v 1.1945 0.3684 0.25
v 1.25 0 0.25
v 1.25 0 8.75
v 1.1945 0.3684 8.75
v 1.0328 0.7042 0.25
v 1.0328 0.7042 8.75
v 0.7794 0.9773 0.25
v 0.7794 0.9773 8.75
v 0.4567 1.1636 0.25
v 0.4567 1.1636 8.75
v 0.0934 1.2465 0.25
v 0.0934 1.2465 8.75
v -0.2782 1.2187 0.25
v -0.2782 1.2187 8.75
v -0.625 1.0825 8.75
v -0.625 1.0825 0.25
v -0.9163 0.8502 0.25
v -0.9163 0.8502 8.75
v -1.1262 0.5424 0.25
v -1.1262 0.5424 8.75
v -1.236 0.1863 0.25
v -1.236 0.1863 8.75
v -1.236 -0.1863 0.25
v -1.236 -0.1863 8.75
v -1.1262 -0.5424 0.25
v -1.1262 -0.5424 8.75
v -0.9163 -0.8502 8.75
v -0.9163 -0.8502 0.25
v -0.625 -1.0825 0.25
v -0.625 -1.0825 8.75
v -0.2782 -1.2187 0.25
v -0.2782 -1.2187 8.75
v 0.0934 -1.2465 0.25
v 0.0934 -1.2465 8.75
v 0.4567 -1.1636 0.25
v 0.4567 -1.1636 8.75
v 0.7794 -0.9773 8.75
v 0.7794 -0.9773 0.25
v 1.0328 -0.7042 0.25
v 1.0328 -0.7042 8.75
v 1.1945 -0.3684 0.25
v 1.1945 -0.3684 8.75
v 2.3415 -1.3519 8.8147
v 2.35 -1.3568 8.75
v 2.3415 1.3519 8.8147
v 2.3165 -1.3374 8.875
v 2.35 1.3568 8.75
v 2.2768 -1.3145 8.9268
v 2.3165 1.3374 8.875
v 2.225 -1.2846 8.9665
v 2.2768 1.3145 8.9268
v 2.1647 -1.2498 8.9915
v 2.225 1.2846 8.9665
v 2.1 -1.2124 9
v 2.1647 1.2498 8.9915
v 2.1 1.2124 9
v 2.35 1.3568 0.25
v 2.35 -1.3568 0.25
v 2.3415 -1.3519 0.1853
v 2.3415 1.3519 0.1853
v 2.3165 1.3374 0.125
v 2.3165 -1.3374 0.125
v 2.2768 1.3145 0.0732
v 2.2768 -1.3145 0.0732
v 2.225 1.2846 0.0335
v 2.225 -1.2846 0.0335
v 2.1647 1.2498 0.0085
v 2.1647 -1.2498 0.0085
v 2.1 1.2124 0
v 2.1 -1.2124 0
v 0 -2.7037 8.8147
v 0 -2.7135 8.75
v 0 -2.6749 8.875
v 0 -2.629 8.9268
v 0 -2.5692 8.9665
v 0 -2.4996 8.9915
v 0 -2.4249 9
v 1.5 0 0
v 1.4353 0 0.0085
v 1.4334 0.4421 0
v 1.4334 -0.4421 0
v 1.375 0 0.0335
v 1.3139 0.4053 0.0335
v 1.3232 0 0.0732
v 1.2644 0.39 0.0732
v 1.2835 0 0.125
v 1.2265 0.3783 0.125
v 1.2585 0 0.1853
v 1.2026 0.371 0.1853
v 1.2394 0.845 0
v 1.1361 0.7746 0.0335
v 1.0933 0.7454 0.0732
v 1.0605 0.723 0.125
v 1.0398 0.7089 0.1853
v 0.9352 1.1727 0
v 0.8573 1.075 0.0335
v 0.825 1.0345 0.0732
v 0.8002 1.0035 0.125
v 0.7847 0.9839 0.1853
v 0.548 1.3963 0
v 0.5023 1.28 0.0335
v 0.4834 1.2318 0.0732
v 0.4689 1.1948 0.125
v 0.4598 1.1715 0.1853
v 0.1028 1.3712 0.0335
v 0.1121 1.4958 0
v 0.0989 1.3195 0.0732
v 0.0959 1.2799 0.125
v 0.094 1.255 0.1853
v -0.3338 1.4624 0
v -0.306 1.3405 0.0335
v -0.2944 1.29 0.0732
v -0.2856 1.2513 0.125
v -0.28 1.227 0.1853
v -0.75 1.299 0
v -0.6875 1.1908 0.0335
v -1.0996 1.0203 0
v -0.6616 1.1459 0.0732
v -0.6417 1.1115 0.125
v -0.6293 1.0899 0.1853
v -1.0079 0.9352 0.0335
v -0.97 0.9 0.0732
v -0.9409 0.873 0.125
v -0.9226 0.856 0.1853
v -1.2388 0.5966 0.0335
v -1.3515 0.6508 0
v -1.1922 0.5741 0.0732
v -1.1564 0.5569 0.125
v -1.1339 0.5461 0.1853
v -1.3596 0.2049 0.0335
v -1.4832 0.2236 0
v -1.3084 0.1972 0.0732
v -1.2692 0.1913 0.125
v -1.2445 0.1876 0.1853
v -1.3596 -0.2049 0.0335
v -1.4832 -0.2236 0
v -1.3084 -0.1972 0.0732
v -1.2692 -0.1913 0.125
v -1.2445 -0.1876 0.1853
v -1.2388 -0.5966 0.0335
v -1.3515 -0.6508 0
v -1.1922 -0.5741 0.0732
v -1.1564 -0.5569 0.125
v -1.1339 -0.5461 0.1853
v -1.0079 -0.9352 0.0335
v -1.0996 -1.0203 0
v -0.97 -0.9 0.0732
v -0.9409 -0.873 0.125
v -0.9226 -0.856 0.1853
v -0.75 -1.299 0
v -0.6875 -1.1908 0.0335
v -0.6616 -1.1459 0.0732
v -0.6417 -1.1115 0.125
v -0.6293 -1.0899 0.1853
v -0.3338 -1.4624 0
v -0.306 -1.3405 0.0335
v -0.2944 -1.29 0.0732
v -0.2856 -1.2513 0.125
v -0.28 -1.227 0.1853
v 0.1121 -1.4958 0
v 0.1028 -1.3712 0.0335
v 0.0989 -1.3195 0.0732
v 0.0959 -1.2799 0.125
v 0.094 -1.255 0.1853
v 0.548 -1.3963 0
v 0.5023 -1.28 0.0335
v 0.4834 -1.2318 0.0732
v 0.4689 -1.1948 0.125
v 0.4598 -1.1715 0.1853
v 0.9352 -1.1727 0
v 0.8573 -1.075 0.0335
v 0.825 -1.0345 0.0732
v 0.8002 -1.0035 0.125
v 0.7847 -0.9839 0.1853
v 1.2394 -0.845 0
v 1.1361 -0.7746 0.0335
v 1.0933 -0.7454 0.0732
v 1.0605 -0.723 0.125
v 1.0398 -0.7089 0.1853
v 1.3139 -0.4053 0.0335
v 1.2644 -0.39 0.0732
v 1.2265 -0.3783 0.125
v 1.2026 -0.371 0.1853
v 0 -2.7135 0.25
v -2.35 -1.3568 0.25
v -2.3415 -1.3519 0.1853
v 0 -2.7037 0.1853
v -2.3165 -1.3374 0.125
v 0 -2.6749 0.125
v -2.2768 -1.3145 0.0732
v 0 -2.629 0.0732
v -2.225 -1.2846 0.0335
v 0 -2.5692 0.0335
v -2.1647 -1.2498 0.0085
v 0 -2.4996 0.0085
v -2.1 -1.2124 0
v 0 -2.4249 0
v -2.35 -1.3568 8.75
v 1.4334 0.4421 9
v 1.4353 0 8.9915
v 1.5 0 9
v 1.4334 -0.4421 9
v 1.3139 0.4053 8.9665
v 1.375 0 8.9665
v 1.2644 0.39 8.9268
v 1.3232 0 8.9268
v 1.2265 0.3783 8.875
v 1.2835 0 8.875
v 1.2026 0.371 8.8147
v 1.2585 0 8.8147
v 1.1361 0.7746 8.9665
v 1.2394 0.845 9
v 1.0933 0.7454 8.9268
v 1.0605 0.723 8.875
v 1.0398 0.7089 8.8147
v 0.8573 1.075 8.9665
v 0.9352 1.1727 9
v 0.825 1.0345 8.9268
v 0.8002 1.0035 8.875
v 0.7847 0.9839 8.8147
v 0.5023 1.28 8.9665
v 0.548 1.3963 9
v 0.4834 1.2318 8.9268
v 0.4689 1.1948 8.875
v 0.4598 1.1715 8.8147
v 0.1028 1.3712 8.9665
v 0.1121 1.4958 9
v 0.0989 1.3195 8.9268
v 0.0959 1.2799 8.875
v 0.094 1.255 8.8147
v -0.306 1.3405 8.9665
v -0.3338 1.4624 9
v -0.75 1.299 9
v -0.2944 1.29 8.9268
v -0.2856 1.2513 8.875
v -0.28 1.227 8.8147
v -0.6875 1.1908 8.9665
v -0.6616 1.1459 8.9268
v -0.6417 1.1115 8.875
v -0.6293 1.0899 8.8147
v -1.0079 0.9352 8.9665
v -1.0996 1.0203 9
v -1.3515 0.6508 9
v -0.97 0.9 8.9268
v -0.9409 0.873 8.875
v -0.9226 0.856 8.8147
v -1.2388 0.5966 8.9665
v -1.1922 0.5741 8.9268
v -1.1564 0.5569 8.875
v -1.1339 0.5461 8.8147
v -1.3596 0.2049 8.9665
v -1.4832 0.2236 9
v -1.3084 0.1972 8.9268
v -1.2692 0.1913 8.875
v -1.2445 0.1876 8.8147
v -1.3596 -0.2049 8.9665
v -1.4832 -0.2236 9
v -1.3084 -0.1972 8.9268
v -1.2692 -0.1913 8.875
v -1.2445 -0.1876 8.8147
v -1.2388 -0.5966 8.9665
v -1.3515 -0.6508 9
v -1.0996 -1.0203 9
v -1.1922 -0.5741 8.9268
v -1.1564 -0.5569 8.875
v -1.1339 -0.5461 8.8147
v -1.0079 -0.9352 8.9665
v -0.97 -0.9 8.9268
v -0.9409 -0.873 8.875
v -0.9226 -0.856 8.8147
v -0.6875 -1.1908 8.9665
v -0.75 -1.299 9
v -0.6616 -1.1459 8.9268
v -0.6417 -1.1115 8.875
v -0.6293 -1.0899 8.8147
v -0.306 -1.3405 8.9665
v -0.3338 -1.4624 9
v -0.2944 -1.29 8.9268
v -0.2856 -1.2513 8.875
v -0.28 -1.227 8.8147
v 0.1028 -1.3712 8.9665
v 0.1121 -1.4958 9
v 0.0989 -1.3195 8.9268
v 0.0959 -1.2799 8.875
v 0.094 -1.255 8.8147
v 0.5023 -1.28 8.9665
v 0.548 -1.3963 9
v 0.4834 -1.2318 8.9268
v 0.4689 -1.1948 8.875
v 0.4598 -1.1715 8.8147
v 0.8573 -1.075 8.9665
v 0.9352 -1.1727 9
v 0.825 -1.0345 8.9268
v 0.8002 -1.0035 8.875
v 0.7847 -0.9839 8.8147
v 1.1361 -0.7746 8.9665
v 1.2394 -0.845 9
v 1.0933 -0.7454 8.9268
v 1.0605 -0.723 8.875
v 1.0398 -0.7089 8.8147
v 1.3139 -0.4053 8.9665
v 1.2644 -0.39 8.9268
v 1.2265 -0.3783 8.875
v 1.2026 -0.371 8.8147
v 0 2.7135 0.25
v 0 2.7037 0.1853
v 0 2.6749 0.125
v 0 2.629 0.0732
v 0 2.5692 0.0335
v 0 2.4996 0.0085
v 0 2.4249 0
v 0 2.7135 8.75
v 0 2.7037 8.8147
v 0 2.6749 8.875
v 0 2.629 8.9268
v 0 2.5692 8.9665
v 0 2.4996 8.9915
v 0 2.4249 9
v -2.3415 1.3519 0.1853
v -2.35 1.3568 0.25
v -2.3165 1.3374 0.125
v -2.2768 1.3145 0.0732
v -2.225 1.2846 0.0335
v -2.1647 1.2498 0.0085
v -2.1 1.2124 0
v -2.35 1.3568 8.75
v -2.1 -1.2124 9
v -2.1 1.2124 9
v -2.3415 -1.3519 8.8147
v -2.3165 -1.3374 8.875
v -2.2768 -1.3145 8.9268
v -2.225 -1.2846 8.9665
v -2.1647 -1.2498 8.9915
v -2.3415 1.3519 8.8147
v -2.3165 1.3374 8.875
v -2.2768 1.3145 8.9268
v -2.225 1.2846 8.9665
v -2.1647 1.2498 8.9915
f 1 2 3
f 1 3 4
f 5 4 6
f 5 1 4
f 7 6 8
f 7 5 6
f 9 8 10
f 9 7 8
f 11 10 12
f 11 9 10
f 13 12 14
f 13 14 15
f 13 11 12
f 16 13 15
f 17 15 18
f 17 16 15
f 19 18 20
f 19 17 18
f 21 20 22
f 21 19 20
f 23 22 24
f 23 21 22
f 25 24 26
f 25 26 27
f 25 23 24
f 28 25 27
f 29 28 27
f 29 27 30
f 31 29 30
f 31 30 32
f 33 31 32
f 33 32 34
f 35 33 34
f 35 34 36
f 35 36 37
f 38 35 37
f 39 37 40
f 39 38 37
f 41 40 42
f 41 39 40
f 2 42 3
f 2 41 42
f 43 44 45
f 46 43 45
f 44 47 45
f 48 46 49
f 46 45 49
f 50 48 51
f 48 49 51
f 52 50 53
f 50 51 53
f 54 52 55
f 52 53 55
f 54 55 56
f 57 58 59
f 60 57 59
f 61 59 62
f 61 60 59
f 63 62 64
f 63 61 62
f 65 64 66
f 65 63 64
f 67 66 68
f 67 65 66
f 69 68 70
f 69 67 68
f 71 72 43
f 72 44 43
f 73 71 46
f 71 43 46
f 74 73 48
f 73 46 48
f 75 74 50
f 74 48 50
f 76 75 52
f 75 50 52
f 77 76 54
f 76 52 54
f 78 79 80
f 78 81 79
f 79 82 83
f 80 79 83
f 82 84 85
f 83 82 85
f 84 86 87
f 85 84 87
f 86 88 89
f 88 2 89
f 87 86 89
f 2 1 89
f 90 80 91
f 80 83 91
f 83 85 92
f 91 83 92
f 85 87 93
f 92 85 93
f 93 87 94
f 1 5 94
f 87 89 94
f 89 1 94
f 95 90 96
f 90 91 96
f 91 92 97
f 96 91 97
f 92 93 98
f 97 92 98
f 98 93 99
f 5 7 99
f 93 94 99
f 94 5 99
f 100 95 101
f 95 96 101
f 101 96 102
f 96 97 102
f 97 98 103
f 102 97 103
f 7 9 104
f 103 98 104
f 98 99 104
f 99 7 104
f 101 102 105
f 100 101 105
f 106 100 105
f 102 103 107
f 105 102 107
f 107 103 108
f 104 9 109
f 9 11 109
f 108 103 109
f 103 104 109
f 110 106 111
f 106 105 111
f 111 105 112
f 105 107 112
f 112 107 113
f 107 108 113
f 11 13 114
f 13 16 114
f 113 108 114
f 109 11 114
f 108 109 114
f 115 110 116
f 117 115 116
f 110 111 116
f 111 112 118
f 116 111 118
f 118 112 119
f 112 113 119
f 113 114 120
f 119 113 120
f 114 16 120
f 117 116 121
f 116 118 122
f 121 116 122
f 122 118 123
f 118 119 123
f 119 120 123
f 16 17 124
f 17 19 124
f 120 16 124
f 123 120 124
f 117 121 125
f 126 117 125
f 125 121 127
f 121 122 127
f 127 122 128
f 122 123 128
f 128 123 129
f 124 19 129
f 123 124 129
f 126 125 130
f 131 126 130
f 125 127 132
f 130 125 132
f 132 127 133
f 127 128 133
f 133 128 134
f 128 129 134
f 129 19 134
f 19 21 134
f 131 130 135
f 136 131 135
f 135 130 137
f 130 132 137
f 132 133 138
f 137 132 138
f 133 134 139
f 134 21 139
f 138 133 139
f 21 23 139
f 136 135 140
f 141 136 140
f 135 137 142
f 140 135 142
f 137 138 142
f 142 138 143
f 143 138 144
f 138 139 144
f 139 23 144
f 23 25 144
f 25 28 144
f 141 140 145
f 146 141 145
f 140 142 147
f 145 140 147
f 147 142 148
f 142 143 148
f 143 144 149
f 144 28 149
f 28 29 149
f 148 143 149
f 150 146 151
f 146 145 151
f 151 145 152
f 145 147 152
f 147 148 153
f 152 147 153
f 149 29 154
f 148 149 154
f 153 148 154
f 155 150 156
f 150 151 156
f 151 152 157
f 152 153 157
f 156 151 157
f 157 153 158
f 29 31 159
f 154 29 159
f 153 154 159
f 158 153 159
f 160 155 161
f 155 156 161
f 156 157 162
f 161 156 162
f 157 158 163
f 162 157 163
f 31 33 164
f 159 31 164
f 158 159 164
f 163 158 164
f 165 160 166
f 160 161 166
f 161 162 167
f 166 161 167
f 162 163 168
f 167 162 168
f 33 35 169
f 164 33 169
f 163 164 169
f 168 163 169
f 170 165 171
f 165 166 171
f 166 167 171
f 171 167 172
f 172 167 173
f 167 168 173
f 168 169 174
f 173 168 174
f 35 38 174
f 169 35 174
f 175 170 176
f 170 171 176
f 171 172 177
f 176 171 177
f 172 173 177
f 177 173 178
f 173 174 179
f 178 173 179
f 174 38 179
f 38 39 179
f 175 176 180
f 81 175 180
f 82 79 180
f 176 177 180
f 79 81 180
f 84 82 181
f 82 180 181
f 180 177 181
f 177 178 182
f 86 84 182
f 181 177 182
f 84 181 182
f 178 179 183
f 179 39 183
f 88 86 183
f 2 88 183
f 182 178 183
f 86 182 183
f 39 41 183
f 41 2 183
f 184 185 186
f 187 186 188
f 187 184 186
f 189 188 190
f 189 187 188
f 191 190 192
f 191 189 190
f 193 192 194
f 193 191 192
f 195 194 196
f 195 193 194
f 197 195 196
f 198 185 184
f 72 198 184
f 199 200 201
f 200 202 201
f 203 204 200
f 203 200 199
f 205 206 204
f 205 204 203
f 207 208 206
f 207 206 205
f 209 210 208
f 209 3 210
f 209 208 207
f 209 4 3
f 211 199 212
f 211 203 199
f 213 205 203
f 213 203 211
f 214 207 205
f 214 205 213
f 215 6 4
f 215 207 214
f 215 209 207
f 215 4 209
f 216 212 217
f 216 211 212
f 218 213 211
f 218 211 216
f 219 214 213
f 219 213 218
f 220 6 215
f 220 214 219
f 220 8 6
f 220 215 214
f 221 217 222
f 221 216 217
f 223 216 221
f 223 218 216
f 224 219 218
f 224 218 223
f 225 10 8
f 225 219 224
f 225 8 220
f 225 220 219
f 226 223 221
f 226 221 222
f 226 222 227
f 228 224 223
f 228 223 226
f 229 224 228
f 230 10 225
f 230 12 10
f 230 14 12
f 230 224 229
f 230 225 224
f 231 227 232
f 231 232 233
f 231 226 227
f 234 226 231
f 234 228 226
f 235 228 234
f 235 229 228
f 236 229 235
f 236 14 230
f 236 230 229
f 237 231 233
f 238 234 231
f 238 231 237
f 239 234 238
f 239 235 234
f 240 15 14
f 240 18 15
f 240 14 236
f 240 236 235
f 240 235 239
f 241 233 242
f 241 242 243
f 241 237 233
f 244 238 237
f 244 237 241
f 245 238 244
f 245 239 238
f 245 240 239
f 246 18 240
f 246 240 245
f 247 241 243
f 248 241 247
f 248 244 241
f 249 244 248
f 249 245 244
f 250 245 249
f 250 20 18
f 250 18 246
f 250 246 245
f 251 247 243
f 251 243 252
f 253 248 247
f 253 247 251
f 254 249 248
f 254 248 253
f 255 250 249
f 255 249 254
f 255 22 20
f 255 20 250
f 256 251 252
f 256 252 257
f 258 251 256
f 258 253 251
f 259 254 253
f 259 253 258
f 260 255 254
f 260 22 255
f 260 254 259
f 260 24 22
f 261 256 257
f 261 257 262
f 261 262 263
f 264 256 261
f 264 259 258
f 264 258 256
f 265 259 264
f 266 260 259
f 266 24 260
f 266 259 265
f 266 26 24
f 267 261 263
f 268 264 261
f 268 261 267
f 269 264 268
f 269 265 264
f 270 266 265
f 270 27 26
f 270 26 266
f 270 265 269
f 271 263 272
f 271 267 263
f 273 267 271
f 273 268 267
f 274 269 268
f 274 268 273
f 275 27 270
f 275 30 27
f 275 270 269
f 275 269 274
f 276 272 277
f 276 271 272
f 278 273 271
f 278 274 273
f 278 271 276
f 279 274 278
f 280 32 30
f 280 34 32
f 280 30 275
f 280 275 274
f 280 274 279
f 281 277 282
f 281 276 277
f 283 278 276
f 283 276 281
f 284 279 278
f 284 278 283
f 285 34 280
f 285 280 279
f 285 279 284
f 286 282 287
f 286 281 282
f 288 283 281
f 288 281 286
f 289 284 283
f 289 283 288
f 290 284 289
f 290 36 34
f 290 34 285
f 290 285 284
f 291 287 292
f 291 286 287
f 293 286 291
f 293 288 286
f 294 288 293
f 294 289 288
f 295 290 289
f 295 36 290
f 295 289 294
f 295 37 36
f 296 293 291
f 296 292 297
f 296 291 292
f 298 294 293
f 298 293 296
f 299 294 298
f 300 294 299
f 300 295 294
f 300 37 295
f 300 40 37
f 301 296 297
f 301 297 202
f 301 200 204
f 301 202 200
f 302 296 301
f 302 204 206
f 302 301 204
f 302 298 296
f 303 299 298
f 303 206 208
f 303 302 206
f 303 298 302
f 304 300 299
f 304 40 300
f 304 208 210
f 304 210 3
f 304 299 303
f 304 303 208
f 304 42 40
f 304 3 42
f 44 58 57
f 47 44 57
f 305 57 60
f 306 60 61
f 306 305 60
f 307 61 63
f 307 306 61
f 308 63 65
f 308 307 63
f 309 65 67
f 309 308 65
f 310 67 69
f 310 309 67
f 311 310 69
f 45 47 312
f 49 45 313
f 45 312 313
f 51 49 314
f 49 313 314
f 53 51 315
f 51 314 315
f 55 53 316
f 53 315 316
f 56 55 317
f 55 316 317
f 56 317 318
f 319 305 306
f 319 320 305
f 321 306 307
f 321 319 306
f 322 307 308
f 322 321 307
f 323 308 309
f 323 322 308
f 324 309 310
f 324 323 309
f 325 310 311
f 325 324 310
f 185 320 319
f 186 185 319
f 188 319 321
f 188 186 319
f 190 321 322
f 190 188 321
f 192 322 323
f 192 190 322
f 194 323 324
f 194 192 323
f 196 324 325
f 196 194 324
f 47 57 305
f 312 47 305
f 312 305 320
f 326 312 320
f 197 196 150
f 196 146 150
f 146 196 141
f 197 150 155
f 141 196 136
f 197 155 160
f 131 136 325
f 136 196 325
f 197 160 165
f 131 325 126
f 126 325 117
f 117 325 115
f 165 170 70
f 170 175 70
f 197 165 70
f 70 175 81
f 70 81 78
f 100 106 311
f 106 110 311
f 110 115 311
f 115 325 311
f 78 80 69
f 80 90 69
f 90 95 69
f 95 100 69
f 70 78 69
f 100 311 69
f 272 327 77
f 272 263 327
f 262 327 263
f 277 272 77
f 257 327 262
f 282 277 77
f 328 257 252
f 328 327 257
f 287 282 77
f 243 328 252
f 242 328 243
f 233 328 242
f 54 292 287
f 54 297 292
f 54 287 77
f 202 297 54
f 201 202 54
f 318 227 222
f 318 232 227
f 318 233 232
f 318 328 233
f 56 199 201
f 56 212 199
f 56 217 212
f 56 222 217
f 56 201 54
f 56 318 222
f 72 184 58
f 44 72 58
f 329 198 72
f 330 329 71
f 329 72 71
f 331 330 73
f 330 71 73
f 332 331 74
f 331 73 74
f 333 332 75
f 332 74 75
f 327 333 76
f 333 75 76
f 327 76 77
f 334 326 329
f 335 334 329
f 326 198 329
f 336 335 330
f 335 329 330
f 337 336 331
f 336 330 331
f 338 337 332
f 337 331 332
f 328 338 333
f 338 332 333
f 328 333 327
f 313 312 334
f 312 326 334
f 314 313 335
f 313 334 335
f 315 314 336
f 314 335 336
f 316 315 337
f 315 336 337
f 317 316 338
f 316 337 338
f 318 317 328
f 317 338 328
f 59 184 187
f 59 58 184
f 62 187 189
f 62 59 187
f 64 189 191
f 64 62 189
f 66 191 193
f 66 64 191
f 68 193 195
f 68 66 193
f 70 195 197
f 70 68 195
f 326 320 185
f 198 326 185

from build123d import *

# Parameters (mm, degrees)
CROQUIS1_R              = 1.25
SALIENTE_EXTRUIR1_DEPTH = 9
REDONDEO1_R             = 0.25
REDONDEO2_R             = 0.25


with BuildPart() as part:
    # Croquis1 → Saliente-Extruir1 (new body)
    with BuildSketch(Plane.XY):
        Polygon((2.35, 1.356773133), (0, 2.713546265), (-2.35, 1.356773133), (-2.35, -1.356773133), (0, -2.713546265), (2.35, -1.356773133), align=None)
        Circle(CROQUIS1_R, mode=Mode.SUBTRACT)
    extrude(amount=SALIENTE_EXTRUIR1_DEPTH)

    # Redondeo1
    redondeo1_edges = [part.edges().sort_by_distance(p)[0] for p in [
        (-1.175, 2.035159699, 9),
        (-2.35, 0, 9),
        (-1.175, -2.035159699, 9),
        (1.175, -2.035159699, 9),
        (2.35, 0, 9),
        (1.175, -2.035159699, 0),
        (-1.175, -2.035159699, 0),
        (-2.35, 0, 0),
        (1.175, 2.035159699, 9),
        (-1.175, 2.035159699, 0),
        (1.175, 2.035159699, 0),
        (2.35, 0, 0),
    ]]
    fillet(redondeo1_edges, radius=REDONDEO1_R)

    # Redondeo2
    redondeo2_edges = [part.edges().sort_by_distance(p)[0] for p in [
        (-1.25, 0, 0),
        (-1.25, 0, 9),
    ]]
    fillet(redondeo2_edges, radius=REDONDEO2_R)


solid = part.part
